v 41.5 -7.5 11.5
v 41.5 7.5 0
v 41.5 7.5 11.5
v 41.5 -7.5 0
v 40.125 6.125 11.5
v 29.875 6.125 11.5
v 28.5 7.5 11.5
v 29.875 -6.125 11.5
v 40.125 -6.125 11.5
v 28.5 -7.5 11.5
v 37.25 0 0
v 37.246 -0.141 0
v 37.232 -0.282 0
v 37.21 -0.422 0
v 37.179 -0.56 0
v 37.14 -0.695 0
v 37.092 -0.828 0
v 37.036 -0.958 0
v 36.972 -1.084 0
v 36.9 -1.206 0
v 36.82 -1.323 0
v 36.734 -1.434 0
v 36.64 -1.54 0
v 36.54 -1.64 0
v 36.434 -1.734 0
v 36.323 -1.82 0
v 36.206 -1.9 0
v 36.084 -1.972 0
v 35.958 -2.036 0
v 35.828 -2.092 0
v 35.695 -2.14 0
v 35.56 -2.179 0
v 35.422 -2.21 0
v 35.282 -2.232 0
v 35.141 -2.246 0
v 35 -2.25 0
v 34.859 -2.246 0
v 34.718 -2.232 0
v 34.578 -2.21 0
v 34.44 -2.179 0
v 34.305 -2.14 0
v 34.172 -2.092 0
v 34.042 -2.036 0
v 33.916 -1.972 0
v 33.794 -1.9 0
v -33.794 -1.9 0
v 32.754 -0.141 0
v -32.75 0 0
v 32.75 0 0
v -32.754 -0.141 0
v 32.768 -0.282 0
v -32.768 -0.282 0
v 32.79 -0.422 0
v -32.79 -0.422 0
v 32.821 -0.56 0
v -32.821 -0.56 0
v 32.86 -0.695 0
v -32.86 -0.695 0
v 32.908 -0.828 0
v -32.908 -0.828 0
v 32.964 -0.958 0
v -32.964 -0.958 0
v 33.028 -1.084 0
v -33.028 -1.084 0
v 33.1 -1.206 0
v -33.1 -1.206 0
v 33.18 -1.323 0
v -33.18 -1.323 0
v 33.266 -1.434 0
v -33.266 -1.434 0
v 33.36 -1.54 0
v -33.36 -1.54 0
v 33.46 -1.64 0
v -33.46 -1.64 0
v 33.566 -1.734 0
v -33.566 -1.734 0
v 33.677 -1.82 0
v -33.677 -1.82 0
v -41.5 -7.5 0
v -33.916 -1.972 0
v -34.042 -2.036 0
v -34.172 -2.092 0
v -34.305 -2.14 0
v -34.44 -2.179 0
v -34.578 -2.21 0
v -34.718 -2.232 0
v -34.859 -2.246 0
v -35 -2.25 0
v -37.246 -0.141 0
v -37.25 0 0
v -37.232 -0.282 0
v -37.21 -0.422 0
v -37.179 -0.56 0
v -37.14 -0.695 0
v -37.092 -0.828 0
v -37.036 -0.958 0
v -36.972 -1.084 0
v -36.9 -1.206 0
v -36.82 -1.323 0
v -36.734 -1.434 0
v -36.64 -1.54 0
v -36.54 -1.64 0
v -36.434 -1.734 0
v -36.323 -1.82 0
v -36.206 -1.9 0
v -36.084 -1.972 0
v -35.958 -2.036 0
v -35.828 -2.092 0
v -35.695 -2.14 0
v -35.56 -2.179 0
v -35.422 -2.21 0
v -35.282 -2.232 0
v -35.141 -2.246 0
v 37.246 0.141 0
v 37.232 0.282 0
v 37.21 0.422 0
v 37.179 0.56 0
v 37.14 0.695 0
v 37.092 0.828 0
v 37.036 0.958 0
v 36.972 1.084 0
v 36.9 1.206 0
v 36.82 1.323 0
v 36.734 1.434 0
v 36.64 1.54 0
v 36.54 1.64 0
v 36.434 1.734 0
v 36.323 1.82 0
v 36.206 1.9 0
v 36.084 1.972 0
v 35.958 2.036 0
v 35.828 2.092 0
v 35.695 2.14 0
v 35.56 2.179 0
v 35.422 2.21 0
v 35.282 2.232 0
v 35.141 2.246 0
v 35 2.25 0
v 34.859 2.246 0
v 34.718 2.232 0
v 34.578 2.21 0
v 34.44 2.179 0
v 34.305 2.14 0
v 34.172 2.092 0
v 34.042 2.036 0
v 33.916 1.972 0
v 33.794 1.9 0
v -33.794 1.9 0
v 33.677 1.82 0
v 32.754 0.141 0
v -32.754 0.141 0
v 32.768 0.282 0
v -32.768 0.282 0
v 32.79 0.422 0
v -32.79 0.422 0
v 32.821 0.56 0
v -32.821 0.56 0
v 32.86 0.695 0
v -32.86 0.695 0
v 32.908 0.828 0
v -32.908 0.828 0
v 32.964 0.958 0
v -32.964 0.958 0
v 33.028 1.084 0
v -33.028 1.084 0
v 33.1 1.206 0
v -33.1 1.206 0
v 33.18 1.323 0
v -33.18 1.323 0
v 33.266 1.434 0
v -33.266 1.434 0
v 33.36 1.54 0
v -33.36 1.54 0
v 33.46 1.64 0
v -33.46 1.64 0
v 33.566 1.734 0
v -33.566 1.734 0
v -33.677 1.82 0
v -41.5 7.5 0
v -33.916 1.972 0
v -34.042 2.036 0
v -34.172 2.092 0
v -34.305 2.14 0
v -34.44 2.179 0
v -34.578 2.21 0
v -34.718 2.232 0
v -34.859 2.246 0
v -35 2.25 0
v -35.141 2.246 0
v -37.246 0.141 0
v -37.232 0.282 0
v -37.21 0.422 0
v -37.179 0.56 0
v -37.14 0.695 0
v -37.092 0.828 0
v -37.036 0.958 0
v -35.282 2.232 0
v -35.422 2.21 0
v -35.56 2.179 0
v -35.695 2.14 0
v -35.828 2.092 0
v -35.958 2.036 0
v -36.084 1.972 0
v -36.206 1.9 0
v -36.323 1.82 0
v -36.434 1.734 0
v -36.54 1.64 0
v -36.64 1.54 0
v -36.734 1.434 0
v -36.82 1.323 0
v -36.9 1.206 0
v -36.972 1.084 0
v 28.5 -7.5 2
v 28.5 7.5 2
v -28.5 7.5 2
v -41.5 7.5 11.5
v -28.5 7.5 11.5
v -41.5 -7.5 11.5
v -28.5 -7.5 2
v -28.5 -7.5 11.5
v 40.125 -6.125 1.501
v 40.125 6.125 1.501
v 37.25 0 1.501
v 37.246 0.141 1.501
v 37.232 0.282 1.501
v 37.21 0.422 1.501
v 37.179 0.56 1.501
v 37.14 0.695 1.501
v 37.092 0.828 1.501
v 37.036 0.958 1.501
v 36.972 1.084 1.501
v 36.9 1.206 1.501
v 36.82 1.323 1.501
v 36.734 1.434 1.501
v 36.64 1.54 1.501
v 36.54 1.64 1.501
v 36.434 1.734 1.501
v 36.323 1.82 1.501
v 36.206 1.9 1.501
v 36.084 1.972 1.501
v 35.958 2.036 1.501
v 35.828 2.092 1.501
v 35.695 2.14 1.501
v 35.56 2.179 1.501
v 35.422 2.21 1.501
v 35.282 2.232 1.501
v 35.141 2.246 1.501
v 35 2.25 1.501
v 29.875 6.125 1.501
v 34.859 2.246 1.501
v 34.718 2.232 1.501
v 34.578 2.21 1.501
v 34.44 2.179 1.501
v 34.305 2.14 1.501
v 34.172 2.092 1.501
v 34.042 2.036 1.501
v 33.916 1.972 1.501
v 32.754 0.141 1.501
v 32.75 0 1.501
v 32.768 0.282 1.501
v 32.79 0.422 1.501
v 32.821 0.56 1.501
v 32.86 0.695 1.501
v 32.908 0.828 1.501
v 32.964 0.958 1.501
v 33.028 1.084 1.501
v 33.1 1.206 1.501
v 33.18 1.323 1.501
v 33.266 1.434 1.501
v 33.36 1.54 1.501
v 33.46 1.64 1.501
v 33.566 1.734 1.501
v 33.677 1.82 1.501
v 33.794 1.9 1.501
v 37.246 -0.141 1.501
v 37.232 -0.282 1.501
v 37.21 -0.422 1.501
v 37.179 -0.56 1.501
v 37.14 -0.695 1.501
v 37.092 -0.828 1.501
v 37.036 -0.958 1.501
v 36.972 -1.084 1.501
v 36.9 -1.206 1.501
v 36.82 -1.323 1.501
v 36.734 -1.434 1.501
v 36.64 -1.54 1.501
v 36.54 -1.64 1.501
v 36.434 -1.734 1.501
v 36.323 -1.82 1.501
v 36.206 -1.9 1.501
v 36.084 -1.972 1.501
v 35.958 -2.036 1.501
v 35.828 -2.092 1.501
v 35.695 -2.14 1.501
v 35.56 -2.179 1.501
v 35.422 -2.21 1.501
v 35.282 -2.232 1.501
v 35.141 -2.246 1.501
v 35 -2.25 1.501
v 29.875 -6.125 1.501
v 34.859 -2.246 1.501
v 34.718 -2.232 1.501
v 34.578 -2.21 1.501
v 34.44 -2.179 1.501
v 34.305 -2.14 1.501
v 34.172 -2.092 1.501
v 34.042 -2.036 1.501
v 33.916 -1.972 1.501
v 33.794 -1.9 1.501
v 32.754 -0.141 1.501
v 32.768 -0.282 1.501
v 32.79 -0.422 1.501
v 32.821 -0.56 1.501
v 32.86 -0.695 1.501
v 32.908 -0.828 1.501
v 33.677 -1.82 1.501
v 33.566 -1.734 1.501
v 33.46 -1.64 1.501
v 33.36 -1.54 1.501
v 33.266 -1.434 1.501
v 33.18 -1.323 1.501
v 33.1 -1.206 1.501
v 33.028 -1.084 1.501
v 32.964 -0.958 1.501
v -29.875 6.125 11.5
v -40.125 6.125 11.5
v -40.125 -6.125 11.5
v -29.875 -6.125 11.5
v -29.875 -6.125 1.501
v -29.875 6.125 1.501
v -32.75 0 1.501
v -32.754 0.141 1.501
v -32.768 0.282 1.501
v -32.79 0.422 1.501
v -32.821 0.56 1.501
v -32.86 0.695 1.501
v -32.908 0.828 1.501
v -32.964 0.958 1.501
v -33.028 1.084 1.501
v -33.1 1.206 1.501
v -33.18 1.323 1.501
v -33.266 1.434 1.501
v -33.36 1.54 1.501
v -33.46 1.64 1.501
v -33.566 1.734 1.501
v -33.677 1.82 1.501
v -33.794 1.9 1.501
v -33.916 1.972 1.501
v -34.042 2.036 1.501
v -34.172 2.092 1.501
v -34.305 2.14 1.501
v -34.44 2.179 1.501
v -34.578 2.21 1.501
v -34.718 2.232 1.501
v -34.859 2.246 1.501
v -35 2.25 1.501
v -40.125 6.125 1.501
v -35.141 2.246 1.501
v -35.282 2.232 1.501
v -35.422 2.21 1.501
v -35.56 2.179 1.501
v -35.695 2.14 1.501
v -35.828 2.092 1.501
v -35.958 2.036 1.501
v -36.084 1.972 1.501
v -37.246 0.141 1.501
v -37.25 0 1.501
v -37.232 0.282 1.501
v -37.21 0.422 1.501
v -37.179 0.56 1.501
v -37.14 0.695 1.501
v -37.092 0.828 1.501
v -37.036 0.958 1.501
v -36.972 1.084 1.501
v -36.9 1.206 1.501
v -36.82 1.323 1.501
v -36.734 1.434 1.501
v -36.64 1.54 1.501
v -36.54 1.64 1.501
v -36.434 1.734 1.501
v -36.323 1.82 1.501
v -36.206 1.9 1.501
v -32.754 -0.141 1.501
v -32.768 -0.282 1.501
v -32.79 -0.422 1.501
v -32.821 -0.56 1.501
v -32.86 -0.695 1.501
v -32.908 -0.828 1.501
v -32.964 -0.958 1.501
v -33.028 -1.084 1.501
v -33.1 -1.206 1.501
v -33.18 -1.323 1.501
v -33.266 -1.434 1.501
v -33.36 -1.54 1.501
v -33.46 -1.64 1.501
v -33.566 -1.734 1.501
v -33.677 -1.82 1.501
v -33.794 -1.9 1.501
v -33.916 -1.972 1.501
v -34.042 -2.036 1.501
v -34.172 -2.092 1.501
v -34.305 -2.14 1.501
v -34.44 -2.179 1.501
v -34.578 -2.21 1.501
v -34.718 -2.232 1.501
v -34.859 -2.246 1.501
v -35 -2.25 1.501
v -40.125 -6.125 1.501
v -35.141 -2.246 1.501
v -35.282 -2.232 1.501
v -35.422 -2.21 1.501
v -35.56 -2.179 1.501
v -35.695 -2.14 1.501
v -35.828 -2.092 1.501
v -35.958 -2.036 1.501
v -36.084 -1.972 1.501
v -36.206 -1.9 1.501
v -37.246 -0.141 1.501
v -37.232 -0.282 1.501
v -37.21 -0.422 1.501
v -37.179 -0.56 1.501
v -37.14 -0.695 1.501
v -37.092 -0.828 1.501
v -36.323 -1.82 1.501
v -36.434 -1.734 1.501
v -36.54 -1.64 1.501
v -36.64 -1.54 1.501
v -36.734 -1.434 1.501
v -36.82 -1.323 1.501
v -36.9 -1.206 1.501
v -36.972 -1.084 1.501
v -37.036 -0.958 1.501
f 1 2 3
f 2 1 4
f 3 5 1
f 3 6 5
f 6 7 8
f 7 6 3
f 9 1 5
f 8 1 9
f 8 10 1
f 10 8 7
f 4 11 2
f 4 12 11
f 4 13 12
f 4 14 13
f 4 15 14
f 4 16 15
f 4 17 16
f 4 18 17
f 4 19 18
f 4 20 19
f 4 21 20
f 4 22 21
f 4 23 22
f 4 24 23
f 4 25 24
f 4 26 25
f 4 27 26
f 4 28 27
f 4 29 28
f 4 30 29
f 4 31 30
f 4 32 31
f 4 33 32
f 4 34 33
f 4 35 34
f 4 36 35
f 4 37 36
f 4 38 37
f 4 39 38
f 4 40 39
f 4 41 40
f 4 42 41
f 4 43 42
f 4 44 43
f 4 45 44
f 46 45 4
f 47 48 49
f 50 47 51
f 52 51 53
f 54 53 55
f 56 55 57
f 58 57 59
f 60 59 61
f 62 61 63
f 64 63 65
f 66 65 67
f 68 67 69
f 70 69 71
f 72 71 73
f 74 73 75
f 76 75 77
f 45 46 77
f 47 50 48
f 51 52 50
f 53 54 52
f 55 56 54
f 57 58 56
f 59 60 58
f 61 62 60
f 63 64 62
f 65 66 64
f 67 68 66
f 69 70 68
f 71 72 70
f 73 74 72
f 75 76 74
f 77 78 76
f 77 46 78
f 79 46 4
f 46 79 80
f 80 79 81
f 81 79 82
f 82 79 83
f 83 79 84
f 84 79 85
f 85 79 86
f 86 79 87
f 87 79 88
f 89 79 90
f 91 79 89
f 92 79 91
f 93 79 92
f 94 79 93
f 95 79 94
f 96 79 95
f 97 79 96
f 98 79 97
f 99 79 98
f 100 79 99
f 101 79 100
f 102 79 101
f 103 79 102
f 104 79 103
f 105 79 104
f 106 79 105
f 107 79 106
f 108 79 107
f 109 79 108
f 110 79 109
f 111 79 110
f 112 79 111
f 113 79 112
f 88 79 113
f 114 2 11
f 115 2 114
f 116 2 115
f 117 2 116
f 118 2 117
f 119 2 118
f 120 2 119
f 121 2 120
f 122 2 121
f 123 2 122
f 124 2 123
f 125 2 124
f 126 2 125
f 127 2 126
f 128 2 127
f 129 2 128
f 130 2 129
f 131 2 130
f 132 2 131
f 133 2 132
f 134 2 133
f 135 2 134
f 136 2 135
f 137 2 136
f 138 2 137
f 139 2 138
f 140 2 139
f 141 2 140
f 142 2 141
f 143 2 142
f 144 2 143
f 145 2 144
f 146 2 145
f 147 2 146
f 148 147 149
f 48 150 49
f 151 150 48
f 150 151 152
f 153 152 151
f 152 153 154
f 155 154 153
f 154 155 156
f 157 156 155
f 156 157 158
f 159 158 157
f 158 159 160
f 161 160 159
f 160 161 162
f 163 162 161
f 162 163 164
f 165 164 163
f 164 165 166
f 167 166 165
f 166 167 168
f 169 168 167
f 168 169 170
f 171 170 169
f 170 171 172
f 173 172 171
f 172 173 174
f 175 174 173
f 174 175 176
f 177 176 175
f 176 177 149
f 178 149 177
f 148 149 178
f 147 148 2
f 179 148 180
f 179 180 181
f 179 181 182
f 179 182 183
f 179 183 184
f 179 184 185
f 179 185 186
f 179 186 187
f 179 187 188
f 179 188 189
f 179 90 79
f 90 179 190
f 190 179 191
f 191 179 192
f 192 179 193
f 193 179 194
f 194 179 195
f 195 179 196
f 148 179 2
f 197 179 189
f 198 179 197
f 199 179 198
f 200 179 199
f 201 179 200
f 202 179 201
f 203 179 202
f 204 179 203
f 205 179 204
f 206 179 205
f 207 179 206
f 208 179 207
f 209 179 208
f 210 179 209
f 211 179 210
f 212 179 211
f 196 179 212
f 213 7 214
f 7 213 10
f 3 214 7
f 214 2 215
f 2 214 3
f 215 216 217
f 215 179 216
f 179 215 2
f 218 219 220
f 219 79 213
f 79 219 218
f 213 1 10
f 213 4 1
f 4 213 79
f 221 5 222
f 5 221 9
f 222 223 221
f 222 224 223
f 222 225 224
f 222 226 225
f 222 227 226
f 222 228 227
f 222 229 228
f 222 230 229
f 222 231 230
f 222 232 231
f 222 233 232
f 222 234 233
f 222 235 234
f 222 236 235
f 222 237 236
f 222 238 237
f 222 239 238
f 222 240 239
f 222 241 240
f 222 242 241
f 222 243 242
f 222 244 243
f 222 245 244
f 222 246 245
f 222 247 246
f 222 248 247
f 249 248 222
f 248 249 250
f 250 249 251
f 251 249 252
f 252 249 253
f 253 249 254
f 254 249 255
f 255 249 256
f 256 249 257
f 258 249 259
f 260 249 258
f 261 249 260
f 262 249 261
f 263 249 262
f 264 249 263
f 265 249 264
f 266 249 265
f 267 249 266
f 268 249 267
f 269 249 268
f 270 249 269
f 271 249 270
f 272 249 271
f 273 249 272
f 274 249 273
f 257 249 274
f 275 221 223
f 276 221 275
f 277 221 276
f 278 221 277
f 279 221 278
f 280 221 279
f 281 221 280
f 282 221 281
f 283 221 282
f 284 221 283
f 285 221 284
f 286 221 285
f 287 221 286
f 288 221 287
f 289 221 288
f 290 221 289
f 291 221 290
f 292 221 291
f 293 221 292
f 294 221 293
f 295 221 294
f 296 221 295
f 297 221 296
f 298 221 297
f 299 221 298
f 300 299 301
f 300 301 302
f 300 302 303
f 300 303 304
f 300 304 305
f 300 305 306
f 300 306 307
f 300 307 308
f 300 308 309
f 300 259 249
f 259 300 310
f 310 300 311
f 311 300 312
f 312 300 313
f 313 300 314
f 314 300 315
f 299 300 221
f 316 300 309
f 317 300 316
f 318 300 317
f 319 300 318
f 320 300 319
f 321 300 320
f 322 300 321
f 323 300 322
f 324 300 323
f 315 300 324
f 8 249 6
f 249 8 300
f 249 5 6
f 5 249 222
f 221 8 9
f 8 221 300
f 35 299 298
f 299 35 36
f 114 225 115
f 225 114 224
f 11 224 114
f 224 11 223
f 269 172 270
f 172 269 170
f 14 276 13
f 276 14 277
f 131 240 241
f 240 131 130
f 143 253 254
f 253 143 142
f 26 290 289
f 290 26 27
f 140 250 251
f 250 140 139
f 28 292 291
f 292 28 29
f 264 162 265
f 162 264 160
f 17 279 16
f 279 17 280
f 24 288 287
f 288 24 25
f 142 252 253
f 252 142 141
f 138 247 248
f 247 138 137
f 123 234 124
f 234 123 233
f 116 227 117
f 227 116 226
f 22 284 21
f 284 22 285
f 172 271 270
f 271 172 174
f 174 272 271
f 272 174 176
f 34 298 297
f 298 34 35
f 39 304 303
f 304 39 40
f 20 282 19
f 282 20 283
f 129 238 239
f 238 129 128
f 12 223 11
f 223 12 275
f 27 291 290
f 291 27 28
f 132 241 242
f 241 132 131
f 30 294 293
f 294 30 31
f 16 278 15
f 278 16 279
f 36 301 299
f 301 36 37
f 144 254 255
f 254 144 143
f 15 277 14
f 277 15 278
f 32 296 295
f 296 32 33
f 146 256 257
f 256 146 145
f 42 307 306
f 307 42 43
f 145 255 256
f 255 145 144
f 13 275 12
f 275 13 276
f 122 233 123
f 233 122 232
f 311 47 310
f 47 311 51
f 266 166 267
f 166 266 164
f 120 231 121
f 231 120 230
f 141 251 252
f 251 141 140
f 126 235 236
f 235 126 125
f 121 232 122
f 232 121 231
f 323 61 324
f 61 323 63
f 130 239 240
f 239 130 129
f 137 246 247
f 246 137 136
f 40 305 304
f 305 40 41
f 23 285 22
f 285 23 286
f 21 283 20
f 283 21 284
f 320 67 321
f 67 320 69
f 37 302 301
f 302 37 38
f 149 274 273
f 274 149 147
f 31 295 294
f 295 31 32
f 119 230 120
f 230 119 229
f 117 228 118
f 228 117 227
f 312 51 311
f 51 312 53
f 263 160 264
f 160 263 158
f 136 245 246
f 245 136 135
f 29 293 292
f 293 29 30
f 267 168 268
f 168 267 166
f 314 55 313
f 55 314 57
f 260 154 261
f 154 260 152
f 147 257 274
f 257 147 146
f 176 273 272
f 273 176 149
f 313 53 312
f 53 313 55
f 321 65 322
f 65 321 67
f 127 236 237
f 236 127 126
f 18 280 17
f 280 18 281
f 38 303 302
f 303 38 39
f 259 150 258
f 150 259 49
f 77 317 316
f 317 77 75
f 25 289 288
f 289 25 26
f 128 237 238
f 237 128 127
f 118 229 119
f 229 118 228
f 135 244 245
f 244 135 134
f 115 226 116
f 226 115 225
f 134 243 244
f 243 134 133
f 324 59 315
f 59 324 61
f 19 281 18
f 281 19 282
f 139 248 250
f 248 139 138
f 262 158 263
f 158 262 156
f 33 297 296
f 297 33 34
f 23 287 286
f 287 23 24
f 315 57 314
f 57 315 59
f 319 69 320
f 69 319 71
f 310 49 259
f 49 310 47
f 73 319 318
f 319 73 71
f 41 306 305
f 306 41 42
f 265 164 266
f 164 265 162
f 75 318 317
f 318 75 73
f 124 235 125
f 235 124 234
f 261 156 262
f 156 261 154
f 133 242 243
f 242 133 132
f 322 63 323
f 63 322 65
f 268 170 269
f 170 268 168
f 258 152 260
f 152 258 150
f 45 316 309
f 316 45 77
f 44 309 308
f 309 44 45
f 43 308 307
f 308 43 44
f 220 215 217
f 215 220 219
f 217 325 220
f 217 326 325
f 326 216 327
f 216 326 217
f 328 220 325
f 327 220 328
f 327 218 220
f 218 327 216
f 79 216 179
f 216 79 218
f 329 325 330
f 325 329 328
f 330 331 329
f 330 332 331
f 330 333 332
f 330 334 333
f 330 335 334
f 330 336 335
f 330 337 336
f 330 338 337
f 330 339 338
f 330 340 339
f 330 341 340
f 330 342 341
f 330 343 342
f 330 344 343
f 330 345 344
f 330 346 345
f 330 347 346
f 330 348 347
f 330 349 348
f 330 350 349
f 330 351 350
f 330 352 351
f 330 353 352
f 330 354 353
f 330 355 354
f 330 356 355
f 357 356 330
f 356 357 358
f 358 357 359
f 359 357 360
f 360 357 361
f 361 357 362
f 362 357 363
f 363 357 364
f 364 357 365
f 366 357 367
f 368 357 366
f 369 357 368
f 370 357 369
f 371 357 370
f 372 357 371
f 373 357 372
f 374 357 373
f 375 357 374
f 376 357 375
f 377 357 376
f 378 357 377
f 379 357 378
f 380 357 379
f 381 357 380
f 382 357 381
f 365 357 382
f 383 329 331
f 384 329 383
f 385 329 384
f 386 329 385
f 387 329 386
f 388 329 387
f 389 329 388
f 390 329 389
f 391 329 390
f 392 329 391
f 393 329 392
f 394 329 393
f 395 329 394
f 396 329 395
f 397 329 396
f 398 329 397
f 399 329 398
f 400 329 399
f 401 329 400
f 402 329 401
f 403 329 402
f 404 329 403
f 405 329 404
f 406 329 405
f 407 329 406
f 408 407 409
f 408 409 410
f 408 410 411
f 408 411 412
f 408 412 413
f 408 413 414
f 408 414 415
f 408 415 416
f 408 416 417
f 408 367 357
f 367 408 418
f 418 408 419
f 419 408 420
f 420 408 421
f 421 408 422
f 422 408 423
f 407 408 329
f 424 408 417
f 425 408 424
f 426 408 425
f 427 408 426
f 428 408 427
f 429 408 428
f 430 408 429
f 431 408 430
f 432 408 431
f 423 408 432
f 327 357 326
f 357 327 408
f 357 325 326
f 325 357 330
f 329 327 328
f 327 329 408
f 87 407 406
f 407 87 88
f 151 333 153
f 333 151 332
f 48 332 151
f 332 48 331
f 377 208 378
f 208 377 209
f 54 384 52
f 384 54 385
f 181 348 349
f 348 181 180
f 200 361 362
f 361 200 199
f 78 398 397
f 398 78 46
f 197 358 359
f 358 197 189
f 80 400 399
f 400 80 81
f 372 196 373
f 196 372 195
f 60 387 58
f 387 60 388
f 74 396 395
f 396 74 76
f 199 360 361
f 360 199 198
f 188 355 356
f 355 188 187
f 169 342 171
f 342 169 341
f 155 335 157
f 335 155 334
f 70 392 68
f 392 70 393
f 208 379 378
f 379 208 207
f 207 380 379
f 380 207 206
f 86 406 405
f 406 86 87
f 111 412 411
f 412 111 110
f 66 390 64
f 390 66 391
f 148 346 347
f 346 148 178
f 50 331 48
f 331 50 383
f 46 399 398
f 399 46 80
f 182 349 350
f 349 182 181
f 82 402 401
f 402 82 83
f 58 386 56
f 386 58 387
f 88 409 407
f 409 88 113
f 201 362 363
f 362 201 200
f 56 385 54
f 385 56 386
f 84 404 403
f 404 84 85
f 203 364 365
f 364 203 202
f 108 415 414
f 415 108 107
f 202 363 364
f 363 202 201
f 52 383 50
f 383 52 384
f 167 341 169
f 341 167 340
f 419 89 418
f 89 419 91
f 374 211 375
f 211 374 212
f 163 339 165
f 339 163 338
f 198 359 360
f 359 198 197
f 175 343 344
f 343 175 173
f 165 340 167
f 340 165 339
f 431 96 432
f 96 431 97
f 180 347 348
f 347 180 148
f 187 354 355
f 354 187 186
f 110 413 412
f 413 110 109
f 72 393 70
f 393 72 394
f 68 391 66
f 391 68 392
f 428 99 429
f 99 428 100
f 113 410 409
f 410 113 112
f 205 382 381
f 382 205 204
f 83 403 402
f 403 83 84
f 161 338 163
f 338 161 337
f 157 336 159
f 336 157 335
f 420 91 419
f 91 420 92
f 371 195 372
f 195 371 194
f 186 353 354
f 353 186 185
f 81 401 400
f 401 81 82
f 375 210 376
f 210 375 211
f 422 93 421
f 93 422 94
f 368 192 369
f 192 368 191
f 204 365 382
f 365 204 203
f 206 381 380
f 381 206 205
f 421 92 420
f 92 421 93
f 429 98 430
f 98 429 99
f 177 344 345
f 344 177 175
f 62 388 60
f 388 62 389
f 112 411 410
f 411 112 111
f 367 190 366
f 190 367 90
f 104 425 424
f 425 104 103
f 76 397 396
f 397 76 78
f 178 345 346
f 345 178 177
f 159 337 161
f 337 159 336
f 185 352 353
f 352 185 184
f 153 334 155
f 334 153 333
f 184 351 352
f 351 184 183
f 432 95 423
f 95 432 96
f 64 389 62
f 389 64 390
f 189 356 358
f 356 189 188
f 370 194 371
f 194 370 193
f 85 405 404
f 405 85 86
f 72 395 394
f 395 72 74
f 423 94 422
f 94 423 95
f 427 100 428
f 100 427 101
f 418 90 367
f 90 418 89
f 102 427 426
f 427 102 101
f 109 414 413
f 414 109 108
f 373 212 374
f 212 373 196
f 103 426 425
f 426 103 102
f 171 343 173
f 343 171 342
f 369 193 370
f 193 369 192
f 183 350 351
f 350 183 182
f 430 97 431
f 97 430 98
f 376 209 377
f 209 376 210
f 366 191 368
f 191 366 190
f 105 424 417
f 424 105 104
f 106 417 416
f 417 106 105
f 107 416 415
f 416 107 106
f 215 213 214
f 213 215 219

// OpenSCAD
$fn=100;
e=0.001;

dist = 70;

union(){
   translate([dist/2,0,0])
      motor();
   translate([-dist/2,0,0])
      motor();
   translate([0,0,1])
   cube([dist-10.5,15,2],center=true);
}



module motor(){
   wall = 1.5;
   depth = 10;
   translate([0,0,depth/2+wall/2])
   difference(){
      cube([10,12,depth]+[2*wall,2*wall,wall],center=true);
      translate([0,0,wall/2+e])
	 cube([10.25,12.25,depth],center=true);
      cylinder(d=4.5, h=4*depth, center=true);
   }
}
